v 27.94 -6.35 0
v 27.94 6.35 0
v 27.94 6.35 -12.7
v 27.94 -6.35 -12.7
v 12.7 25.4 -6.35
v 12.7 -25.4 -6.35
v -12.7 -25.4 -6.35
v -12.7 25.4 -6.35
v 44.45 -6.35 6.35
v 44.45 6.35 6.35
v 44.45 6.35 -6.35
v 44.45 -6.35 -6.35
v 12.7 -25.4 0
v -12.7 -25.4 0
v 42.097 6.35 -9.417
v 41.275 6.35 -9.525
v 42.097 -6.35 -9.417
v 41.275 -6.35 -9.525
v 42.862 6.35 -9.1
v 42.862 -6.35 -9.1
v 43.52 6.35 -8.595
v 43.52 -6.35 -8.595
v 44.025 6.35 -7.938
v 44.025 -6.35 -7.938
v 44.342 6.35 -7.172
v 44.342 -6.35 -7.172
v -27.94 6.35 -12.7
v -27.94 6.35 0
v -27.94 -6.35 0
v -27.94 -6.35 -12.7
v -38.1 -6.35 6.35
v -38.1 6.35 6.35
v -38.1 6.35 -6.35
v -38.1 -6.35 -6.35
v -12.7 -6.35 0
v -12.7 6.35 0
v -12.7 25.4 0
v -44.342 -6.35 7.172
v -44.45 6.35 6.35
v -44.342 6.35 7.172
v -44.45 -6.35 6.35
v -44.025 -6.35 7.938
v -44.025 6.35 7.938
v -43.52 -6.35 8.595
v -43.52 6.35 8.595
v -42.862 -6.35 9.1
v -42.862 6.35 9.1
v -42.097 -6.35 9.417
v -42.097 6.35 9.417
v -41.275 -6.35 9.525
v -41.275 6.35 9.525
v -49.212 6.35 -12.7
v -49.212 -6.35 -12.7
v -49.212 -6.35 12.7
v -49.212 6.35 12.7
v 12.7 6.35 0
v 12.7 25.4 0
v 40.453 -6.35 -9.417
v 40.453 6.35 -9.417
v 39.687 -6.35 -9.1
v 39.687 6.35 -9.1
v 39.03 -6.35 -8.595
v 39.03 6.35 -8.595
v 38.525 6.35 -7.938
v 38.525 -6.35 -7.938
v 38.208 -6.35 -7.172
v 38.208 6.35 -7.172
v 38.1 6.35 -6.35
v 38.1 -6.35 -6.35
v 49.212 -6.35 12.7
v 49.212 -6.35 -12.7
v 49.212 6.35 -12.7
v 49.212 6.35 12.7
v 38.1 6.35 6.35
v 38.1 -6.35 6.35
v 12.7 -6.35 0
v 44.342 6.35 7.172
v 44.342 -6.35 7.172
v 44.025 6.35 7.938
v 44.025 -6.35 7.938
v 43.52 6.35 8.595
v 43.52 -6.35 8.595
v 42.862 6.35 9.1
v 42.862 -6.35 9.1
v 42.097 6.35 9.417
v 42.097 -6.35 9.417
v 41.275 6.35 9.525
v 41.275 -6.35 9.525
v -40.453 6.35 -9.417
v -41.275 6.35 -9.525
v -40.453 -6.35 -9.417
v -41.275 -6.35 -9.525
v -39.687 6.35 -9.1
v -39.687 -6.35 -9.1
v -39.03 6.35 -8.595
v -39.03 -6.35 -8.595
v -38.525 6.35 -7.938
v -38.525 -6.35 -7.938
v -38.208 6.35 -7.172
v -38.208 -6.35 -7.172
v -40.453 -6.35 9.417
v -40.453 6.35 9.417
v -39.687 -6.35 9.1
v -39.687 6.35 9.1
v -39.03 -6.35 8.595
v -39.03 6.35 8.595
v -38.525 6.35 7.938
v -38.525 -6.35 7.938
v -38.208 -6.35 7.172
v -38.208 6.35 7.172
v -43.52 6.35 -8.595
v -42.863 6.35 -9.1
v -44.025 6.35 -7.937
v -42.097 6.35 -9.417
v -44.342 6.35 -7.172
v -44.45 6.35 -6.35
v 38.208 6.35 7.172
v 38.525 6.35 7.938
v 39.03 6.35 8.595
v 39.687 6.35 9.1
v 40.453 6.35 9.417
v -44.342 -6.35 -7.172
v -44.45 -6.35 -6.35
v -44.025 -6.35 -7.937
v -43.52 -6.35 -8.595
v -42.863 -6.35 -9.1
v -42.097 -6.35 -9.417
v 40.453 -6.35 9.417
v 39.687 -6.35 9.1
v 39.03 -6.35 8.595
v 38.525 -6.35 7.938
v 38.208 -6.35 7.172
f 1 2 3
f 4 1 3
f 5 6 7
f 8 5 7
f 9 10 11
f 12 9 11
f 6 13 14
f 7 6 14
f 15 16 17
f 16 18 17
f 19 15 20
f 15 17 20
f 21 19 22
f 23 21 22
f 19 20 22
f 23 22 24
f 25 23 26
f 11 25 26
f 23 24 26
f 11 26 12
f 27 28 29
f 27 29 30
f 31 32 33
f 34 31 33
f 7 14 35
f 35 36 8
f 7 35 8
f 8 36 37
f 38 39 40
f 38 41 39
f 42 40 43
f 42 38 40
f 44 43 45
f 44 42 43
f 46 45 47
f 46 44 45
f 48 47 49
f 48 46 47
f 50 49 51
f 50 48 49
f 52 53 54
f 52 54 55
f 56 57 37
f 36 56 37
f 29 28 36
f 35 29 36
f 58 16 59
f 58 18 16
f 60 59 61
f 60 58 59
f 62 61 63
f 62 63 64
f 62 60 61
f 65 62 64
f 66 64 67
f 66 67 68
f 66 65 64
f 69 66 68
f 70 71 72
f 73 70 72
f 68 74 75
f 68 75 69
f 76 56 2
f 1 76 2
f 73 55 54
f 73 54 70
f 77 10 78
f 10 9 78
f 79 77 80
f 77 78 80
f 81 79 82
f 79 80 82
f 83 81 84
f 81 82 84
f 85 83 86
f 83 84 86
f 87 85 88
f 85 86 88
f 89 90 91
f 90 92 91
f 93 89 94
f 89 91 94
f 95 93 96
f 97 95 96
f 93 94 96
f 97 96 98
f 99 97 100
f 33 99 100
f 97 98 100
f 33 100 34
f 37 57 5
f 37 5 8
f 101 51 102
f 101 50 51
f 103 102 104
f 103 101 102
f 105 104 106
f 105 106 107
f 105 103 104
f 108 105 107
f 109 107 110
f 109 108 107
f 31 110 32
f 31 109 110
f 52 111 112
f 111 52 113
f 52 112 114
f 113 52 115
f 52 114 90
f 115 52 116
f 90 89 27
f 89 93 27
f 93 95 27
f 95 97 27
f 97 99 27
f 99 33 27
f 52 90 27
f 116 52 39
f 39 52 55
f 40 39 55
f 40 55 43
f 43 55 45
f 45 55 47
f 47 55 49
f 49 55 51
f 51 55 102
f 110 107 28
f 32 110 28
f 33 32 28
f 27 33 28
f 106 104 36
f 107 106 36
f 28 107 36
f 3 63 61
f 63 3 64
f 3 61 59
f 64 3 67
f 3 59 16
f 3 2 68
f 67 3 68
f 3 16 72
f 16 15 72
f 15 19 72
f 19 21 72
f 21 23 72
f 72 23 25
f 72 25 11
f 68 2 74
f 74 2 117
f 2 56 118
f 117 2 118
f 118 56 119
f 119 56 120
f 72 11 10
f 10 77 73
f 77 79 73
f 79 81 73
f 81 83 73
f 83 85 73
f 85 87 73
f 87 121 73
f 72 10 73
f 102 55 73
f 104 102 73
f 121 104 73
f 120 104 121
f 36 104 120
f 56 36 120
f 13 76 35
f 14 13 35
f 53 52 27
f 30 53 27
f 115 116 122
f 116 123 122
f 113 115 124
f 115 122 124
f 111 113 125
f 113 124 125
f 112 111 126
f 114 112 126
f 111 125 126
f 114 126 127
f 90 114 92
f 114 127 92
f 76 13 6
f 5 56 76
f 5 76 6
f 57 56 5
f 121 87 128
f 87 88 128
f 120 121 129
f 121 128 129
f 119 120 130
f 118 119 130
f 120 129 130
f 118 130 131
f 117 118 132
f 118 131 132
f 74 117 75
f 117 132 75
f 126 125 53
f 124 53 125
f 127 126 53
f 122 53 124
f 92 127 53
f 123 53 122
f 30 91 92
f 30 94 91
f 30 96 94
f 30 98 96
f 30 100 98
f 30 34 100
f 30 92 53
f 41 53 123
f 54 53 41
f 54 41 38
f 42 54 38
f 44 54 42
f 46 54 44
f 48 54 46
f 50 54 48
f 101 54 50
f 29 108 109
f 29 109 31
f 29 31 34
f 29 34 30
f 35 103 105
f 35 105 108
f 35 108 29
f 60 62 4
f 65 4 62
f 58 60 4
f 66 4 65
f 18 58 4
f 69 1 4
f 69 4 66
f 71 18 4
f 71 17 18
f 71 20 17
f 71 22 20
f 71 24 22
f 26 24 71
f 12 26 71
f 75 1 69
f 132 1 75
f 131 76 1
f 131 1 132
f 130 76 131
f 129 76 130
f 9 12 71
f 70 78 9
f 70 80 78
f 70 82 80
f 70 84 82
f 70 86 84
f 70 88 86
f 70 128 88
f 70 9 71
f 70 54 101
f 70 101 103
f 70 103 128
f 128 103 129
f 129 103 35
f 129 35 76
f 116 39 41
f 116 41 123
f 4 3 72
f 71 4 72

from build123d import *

# Parameters (mm, degrees)
SKETCH1_W            = 98.425
SKETCH1_H            = 12.7
BOSS_EXTRUDE1_DEPTH  = 12.7
CUT_EXTRUDE1_REACH   = 54.388
SKETCH2_W            = 6.35
SKETCH2_H            = 19.05
FILLET1_R            = 3.175
FILLET2_R            = 3.175
FILLET3_R            = 3.175
FILLET4_R            = 3.175
FILLET1_OF_MIRROR1_R = 3.175
FILLET2_OF_MIRROR1_R = 3.175
FILLET3_OF_MIRROR1_R = 3.175
FILLET4_OF_MIRROR1_R = 3.175
CUT_EXTRUDE2_REACH   = 54.388
SKETCH5_W            = 55.88
SKETCH5_H            = 12.7
SKETCH6_W            = 25.4
SKETCH6_H            = 50.8
BOSS_EXTRUDE3_DEPTH  = 6.35


with BuildPart() as part:
    # Sketch1 → Boss-Extrude1 (new, symmetric)
    with BuildSketch(Plane.XY):
        Rectangle(SKETCH1_W, SKETCH1_H)
    extrude(amount=BOSS_EXTRUDE1_DEPTH, both=True)

    # Sketch2 → Cut-Extrude1 (cut, up to next)
    with BuildSketch(Plane(origin=(0, 6.35, 0), x_dir=(1, 0, 0), z_dir=(0, 1, 0)), mode=Mode.PRIVATE) as cut_extrude1_sk1:
        with Locations((-41.275, 0)):
            Rectangle(SKETCH2_W, SKETCH2_H)
    cut_extrude1_tool1 = extrude(cut_extrude1_sk1.sketch, amount=-CUT_EXTRUDE1_REACH, mode=Mode.PRIVATE) & part.part
    cut_extrude1 = cut_extrude1_tool1.solids().sort_by_distance((-41.275, 6.35, 0))[0]
    add(cut_extrude1, mode=Mode.SUBTRACT)

    # Fillet1
    fillet1_edges = [part.edges().sort_by_distance(p)[0] for p in [
        (-44.45, 0, -9.525),
    ]]
    fillet(fillet1_edges, radius=FILLET1_R)

    # Fillet2
    fillet2_edges = [part.edges().sort_by_distance(p)[0] for p in [
        (-38.1, 0, -9.525),
    ]]
    fillet(fillet2_edges, radius=FILLET2_R - 0.0001)  # a hair under: the kernel refuses the full size

    # Fillet3
    fillet3_edges = [part.edges().sort_by_distance(p)[0] for p in [
        (-44.45, 0, 9.525),
    ]]
    fillet(fillet3_edges, radius=FILLET3_R)

    # Fillet4
    fillet4_edges = [part.edges().sort_by_distance(p)[0] for p in [
        (-38.1, 0, 9.525),
    ]]
    fillet(fillet4_edges, radius=FILLET4_R - 0.0001)  # a hair under: the kernel refuses the full size

    # Mirror1: Cut-Extrude1 across plane
    add(cut_extrude1.mirror(Plane(origin=(0, 0, 0), x_dir=(0, 0, 1), z_dir=(1, 0, 0))), mode=Mode.SUBTRACT)

    # Fillet1 of Mirror1
    fillet1_of_mirror1_edges = [part.edges().sort_by_distance(p)[0] for p in [
        (44.45, 0, -9.525),
    ]]
    fillet(fillet1_of_mirror1_edges, radius=FILLET1_OF_MIRROR1_R)

    # Fillet2 of Mirror1
    fillet2_of_mirror1_edges = [part.edges().sort_by_distance(p)[0] for p in [
        (38.1, 0, -9.525),
    ]]
    fillet(fillet2_of_mirror1_edges, radius=FILLET2_OF_MIRROR1_R - 0.0001)  # a hair under: the kernel refuses the full size

    # Fillet3 of Mirror1
    fillet3_of_mirror1_edges = [part.edges().sort_by_distance(p)[0] for p in [
        (44.45, 0, 9.525),
    ]]
    fillet(fillet3_of_mirror1_edges, radius=FILLET3_OF_MIRROR1_R)

    # Fillet4 of Mirror1
    fillet4_of_mirror1_edges = [part.edges().sort_by_distance(p)[0] for p in [
        (38.1, 0, 9.525),
    ]]
    fillet(fillet4_of_mirror1_edges, radius=FILLET4_OF_MIRROR1_R - 0.0001)  # a hair under: the kernel refuses the full size

    # Sketch5 → Cut-Extrude2 (cut, up to next)
    with BuildSketch(Plane(origin=(0, 6.35, 0), x_dir=(1, 0, 0), z_dir=(0, 1, 0)), mode=Mode.PRIVATE) as cut_extrude2_sk1:
        with Locations((0, 6.35)):
            Rectangle(SKETCH5_W, SKETCH5_H)
    cut_extrude2_tool1 = extrude(cut_extrude2_sk1.sketch, amount=-CUT_EXTRUDE2_REACH, mode=Mode.PRIVATE) & part.part
    add(cut_extrude2_tool1.solids().sort_by_distance((0, 6.35, -6.35))[0], mode=Mode.SUBTRACT)

    # Sketch6 → Boss-Extrude3 (add)
    with BuildSketch(Plane(origin=(0, 0, 0), x_dir=(-1, 0, 0), z_dir=(0, 0, -1))):
        Rectangle(SKETCH6_W, SKETCH6_H)
    extrude(amount=BOSS_EXTRUDE3_DEPTH)


solid = part.part
